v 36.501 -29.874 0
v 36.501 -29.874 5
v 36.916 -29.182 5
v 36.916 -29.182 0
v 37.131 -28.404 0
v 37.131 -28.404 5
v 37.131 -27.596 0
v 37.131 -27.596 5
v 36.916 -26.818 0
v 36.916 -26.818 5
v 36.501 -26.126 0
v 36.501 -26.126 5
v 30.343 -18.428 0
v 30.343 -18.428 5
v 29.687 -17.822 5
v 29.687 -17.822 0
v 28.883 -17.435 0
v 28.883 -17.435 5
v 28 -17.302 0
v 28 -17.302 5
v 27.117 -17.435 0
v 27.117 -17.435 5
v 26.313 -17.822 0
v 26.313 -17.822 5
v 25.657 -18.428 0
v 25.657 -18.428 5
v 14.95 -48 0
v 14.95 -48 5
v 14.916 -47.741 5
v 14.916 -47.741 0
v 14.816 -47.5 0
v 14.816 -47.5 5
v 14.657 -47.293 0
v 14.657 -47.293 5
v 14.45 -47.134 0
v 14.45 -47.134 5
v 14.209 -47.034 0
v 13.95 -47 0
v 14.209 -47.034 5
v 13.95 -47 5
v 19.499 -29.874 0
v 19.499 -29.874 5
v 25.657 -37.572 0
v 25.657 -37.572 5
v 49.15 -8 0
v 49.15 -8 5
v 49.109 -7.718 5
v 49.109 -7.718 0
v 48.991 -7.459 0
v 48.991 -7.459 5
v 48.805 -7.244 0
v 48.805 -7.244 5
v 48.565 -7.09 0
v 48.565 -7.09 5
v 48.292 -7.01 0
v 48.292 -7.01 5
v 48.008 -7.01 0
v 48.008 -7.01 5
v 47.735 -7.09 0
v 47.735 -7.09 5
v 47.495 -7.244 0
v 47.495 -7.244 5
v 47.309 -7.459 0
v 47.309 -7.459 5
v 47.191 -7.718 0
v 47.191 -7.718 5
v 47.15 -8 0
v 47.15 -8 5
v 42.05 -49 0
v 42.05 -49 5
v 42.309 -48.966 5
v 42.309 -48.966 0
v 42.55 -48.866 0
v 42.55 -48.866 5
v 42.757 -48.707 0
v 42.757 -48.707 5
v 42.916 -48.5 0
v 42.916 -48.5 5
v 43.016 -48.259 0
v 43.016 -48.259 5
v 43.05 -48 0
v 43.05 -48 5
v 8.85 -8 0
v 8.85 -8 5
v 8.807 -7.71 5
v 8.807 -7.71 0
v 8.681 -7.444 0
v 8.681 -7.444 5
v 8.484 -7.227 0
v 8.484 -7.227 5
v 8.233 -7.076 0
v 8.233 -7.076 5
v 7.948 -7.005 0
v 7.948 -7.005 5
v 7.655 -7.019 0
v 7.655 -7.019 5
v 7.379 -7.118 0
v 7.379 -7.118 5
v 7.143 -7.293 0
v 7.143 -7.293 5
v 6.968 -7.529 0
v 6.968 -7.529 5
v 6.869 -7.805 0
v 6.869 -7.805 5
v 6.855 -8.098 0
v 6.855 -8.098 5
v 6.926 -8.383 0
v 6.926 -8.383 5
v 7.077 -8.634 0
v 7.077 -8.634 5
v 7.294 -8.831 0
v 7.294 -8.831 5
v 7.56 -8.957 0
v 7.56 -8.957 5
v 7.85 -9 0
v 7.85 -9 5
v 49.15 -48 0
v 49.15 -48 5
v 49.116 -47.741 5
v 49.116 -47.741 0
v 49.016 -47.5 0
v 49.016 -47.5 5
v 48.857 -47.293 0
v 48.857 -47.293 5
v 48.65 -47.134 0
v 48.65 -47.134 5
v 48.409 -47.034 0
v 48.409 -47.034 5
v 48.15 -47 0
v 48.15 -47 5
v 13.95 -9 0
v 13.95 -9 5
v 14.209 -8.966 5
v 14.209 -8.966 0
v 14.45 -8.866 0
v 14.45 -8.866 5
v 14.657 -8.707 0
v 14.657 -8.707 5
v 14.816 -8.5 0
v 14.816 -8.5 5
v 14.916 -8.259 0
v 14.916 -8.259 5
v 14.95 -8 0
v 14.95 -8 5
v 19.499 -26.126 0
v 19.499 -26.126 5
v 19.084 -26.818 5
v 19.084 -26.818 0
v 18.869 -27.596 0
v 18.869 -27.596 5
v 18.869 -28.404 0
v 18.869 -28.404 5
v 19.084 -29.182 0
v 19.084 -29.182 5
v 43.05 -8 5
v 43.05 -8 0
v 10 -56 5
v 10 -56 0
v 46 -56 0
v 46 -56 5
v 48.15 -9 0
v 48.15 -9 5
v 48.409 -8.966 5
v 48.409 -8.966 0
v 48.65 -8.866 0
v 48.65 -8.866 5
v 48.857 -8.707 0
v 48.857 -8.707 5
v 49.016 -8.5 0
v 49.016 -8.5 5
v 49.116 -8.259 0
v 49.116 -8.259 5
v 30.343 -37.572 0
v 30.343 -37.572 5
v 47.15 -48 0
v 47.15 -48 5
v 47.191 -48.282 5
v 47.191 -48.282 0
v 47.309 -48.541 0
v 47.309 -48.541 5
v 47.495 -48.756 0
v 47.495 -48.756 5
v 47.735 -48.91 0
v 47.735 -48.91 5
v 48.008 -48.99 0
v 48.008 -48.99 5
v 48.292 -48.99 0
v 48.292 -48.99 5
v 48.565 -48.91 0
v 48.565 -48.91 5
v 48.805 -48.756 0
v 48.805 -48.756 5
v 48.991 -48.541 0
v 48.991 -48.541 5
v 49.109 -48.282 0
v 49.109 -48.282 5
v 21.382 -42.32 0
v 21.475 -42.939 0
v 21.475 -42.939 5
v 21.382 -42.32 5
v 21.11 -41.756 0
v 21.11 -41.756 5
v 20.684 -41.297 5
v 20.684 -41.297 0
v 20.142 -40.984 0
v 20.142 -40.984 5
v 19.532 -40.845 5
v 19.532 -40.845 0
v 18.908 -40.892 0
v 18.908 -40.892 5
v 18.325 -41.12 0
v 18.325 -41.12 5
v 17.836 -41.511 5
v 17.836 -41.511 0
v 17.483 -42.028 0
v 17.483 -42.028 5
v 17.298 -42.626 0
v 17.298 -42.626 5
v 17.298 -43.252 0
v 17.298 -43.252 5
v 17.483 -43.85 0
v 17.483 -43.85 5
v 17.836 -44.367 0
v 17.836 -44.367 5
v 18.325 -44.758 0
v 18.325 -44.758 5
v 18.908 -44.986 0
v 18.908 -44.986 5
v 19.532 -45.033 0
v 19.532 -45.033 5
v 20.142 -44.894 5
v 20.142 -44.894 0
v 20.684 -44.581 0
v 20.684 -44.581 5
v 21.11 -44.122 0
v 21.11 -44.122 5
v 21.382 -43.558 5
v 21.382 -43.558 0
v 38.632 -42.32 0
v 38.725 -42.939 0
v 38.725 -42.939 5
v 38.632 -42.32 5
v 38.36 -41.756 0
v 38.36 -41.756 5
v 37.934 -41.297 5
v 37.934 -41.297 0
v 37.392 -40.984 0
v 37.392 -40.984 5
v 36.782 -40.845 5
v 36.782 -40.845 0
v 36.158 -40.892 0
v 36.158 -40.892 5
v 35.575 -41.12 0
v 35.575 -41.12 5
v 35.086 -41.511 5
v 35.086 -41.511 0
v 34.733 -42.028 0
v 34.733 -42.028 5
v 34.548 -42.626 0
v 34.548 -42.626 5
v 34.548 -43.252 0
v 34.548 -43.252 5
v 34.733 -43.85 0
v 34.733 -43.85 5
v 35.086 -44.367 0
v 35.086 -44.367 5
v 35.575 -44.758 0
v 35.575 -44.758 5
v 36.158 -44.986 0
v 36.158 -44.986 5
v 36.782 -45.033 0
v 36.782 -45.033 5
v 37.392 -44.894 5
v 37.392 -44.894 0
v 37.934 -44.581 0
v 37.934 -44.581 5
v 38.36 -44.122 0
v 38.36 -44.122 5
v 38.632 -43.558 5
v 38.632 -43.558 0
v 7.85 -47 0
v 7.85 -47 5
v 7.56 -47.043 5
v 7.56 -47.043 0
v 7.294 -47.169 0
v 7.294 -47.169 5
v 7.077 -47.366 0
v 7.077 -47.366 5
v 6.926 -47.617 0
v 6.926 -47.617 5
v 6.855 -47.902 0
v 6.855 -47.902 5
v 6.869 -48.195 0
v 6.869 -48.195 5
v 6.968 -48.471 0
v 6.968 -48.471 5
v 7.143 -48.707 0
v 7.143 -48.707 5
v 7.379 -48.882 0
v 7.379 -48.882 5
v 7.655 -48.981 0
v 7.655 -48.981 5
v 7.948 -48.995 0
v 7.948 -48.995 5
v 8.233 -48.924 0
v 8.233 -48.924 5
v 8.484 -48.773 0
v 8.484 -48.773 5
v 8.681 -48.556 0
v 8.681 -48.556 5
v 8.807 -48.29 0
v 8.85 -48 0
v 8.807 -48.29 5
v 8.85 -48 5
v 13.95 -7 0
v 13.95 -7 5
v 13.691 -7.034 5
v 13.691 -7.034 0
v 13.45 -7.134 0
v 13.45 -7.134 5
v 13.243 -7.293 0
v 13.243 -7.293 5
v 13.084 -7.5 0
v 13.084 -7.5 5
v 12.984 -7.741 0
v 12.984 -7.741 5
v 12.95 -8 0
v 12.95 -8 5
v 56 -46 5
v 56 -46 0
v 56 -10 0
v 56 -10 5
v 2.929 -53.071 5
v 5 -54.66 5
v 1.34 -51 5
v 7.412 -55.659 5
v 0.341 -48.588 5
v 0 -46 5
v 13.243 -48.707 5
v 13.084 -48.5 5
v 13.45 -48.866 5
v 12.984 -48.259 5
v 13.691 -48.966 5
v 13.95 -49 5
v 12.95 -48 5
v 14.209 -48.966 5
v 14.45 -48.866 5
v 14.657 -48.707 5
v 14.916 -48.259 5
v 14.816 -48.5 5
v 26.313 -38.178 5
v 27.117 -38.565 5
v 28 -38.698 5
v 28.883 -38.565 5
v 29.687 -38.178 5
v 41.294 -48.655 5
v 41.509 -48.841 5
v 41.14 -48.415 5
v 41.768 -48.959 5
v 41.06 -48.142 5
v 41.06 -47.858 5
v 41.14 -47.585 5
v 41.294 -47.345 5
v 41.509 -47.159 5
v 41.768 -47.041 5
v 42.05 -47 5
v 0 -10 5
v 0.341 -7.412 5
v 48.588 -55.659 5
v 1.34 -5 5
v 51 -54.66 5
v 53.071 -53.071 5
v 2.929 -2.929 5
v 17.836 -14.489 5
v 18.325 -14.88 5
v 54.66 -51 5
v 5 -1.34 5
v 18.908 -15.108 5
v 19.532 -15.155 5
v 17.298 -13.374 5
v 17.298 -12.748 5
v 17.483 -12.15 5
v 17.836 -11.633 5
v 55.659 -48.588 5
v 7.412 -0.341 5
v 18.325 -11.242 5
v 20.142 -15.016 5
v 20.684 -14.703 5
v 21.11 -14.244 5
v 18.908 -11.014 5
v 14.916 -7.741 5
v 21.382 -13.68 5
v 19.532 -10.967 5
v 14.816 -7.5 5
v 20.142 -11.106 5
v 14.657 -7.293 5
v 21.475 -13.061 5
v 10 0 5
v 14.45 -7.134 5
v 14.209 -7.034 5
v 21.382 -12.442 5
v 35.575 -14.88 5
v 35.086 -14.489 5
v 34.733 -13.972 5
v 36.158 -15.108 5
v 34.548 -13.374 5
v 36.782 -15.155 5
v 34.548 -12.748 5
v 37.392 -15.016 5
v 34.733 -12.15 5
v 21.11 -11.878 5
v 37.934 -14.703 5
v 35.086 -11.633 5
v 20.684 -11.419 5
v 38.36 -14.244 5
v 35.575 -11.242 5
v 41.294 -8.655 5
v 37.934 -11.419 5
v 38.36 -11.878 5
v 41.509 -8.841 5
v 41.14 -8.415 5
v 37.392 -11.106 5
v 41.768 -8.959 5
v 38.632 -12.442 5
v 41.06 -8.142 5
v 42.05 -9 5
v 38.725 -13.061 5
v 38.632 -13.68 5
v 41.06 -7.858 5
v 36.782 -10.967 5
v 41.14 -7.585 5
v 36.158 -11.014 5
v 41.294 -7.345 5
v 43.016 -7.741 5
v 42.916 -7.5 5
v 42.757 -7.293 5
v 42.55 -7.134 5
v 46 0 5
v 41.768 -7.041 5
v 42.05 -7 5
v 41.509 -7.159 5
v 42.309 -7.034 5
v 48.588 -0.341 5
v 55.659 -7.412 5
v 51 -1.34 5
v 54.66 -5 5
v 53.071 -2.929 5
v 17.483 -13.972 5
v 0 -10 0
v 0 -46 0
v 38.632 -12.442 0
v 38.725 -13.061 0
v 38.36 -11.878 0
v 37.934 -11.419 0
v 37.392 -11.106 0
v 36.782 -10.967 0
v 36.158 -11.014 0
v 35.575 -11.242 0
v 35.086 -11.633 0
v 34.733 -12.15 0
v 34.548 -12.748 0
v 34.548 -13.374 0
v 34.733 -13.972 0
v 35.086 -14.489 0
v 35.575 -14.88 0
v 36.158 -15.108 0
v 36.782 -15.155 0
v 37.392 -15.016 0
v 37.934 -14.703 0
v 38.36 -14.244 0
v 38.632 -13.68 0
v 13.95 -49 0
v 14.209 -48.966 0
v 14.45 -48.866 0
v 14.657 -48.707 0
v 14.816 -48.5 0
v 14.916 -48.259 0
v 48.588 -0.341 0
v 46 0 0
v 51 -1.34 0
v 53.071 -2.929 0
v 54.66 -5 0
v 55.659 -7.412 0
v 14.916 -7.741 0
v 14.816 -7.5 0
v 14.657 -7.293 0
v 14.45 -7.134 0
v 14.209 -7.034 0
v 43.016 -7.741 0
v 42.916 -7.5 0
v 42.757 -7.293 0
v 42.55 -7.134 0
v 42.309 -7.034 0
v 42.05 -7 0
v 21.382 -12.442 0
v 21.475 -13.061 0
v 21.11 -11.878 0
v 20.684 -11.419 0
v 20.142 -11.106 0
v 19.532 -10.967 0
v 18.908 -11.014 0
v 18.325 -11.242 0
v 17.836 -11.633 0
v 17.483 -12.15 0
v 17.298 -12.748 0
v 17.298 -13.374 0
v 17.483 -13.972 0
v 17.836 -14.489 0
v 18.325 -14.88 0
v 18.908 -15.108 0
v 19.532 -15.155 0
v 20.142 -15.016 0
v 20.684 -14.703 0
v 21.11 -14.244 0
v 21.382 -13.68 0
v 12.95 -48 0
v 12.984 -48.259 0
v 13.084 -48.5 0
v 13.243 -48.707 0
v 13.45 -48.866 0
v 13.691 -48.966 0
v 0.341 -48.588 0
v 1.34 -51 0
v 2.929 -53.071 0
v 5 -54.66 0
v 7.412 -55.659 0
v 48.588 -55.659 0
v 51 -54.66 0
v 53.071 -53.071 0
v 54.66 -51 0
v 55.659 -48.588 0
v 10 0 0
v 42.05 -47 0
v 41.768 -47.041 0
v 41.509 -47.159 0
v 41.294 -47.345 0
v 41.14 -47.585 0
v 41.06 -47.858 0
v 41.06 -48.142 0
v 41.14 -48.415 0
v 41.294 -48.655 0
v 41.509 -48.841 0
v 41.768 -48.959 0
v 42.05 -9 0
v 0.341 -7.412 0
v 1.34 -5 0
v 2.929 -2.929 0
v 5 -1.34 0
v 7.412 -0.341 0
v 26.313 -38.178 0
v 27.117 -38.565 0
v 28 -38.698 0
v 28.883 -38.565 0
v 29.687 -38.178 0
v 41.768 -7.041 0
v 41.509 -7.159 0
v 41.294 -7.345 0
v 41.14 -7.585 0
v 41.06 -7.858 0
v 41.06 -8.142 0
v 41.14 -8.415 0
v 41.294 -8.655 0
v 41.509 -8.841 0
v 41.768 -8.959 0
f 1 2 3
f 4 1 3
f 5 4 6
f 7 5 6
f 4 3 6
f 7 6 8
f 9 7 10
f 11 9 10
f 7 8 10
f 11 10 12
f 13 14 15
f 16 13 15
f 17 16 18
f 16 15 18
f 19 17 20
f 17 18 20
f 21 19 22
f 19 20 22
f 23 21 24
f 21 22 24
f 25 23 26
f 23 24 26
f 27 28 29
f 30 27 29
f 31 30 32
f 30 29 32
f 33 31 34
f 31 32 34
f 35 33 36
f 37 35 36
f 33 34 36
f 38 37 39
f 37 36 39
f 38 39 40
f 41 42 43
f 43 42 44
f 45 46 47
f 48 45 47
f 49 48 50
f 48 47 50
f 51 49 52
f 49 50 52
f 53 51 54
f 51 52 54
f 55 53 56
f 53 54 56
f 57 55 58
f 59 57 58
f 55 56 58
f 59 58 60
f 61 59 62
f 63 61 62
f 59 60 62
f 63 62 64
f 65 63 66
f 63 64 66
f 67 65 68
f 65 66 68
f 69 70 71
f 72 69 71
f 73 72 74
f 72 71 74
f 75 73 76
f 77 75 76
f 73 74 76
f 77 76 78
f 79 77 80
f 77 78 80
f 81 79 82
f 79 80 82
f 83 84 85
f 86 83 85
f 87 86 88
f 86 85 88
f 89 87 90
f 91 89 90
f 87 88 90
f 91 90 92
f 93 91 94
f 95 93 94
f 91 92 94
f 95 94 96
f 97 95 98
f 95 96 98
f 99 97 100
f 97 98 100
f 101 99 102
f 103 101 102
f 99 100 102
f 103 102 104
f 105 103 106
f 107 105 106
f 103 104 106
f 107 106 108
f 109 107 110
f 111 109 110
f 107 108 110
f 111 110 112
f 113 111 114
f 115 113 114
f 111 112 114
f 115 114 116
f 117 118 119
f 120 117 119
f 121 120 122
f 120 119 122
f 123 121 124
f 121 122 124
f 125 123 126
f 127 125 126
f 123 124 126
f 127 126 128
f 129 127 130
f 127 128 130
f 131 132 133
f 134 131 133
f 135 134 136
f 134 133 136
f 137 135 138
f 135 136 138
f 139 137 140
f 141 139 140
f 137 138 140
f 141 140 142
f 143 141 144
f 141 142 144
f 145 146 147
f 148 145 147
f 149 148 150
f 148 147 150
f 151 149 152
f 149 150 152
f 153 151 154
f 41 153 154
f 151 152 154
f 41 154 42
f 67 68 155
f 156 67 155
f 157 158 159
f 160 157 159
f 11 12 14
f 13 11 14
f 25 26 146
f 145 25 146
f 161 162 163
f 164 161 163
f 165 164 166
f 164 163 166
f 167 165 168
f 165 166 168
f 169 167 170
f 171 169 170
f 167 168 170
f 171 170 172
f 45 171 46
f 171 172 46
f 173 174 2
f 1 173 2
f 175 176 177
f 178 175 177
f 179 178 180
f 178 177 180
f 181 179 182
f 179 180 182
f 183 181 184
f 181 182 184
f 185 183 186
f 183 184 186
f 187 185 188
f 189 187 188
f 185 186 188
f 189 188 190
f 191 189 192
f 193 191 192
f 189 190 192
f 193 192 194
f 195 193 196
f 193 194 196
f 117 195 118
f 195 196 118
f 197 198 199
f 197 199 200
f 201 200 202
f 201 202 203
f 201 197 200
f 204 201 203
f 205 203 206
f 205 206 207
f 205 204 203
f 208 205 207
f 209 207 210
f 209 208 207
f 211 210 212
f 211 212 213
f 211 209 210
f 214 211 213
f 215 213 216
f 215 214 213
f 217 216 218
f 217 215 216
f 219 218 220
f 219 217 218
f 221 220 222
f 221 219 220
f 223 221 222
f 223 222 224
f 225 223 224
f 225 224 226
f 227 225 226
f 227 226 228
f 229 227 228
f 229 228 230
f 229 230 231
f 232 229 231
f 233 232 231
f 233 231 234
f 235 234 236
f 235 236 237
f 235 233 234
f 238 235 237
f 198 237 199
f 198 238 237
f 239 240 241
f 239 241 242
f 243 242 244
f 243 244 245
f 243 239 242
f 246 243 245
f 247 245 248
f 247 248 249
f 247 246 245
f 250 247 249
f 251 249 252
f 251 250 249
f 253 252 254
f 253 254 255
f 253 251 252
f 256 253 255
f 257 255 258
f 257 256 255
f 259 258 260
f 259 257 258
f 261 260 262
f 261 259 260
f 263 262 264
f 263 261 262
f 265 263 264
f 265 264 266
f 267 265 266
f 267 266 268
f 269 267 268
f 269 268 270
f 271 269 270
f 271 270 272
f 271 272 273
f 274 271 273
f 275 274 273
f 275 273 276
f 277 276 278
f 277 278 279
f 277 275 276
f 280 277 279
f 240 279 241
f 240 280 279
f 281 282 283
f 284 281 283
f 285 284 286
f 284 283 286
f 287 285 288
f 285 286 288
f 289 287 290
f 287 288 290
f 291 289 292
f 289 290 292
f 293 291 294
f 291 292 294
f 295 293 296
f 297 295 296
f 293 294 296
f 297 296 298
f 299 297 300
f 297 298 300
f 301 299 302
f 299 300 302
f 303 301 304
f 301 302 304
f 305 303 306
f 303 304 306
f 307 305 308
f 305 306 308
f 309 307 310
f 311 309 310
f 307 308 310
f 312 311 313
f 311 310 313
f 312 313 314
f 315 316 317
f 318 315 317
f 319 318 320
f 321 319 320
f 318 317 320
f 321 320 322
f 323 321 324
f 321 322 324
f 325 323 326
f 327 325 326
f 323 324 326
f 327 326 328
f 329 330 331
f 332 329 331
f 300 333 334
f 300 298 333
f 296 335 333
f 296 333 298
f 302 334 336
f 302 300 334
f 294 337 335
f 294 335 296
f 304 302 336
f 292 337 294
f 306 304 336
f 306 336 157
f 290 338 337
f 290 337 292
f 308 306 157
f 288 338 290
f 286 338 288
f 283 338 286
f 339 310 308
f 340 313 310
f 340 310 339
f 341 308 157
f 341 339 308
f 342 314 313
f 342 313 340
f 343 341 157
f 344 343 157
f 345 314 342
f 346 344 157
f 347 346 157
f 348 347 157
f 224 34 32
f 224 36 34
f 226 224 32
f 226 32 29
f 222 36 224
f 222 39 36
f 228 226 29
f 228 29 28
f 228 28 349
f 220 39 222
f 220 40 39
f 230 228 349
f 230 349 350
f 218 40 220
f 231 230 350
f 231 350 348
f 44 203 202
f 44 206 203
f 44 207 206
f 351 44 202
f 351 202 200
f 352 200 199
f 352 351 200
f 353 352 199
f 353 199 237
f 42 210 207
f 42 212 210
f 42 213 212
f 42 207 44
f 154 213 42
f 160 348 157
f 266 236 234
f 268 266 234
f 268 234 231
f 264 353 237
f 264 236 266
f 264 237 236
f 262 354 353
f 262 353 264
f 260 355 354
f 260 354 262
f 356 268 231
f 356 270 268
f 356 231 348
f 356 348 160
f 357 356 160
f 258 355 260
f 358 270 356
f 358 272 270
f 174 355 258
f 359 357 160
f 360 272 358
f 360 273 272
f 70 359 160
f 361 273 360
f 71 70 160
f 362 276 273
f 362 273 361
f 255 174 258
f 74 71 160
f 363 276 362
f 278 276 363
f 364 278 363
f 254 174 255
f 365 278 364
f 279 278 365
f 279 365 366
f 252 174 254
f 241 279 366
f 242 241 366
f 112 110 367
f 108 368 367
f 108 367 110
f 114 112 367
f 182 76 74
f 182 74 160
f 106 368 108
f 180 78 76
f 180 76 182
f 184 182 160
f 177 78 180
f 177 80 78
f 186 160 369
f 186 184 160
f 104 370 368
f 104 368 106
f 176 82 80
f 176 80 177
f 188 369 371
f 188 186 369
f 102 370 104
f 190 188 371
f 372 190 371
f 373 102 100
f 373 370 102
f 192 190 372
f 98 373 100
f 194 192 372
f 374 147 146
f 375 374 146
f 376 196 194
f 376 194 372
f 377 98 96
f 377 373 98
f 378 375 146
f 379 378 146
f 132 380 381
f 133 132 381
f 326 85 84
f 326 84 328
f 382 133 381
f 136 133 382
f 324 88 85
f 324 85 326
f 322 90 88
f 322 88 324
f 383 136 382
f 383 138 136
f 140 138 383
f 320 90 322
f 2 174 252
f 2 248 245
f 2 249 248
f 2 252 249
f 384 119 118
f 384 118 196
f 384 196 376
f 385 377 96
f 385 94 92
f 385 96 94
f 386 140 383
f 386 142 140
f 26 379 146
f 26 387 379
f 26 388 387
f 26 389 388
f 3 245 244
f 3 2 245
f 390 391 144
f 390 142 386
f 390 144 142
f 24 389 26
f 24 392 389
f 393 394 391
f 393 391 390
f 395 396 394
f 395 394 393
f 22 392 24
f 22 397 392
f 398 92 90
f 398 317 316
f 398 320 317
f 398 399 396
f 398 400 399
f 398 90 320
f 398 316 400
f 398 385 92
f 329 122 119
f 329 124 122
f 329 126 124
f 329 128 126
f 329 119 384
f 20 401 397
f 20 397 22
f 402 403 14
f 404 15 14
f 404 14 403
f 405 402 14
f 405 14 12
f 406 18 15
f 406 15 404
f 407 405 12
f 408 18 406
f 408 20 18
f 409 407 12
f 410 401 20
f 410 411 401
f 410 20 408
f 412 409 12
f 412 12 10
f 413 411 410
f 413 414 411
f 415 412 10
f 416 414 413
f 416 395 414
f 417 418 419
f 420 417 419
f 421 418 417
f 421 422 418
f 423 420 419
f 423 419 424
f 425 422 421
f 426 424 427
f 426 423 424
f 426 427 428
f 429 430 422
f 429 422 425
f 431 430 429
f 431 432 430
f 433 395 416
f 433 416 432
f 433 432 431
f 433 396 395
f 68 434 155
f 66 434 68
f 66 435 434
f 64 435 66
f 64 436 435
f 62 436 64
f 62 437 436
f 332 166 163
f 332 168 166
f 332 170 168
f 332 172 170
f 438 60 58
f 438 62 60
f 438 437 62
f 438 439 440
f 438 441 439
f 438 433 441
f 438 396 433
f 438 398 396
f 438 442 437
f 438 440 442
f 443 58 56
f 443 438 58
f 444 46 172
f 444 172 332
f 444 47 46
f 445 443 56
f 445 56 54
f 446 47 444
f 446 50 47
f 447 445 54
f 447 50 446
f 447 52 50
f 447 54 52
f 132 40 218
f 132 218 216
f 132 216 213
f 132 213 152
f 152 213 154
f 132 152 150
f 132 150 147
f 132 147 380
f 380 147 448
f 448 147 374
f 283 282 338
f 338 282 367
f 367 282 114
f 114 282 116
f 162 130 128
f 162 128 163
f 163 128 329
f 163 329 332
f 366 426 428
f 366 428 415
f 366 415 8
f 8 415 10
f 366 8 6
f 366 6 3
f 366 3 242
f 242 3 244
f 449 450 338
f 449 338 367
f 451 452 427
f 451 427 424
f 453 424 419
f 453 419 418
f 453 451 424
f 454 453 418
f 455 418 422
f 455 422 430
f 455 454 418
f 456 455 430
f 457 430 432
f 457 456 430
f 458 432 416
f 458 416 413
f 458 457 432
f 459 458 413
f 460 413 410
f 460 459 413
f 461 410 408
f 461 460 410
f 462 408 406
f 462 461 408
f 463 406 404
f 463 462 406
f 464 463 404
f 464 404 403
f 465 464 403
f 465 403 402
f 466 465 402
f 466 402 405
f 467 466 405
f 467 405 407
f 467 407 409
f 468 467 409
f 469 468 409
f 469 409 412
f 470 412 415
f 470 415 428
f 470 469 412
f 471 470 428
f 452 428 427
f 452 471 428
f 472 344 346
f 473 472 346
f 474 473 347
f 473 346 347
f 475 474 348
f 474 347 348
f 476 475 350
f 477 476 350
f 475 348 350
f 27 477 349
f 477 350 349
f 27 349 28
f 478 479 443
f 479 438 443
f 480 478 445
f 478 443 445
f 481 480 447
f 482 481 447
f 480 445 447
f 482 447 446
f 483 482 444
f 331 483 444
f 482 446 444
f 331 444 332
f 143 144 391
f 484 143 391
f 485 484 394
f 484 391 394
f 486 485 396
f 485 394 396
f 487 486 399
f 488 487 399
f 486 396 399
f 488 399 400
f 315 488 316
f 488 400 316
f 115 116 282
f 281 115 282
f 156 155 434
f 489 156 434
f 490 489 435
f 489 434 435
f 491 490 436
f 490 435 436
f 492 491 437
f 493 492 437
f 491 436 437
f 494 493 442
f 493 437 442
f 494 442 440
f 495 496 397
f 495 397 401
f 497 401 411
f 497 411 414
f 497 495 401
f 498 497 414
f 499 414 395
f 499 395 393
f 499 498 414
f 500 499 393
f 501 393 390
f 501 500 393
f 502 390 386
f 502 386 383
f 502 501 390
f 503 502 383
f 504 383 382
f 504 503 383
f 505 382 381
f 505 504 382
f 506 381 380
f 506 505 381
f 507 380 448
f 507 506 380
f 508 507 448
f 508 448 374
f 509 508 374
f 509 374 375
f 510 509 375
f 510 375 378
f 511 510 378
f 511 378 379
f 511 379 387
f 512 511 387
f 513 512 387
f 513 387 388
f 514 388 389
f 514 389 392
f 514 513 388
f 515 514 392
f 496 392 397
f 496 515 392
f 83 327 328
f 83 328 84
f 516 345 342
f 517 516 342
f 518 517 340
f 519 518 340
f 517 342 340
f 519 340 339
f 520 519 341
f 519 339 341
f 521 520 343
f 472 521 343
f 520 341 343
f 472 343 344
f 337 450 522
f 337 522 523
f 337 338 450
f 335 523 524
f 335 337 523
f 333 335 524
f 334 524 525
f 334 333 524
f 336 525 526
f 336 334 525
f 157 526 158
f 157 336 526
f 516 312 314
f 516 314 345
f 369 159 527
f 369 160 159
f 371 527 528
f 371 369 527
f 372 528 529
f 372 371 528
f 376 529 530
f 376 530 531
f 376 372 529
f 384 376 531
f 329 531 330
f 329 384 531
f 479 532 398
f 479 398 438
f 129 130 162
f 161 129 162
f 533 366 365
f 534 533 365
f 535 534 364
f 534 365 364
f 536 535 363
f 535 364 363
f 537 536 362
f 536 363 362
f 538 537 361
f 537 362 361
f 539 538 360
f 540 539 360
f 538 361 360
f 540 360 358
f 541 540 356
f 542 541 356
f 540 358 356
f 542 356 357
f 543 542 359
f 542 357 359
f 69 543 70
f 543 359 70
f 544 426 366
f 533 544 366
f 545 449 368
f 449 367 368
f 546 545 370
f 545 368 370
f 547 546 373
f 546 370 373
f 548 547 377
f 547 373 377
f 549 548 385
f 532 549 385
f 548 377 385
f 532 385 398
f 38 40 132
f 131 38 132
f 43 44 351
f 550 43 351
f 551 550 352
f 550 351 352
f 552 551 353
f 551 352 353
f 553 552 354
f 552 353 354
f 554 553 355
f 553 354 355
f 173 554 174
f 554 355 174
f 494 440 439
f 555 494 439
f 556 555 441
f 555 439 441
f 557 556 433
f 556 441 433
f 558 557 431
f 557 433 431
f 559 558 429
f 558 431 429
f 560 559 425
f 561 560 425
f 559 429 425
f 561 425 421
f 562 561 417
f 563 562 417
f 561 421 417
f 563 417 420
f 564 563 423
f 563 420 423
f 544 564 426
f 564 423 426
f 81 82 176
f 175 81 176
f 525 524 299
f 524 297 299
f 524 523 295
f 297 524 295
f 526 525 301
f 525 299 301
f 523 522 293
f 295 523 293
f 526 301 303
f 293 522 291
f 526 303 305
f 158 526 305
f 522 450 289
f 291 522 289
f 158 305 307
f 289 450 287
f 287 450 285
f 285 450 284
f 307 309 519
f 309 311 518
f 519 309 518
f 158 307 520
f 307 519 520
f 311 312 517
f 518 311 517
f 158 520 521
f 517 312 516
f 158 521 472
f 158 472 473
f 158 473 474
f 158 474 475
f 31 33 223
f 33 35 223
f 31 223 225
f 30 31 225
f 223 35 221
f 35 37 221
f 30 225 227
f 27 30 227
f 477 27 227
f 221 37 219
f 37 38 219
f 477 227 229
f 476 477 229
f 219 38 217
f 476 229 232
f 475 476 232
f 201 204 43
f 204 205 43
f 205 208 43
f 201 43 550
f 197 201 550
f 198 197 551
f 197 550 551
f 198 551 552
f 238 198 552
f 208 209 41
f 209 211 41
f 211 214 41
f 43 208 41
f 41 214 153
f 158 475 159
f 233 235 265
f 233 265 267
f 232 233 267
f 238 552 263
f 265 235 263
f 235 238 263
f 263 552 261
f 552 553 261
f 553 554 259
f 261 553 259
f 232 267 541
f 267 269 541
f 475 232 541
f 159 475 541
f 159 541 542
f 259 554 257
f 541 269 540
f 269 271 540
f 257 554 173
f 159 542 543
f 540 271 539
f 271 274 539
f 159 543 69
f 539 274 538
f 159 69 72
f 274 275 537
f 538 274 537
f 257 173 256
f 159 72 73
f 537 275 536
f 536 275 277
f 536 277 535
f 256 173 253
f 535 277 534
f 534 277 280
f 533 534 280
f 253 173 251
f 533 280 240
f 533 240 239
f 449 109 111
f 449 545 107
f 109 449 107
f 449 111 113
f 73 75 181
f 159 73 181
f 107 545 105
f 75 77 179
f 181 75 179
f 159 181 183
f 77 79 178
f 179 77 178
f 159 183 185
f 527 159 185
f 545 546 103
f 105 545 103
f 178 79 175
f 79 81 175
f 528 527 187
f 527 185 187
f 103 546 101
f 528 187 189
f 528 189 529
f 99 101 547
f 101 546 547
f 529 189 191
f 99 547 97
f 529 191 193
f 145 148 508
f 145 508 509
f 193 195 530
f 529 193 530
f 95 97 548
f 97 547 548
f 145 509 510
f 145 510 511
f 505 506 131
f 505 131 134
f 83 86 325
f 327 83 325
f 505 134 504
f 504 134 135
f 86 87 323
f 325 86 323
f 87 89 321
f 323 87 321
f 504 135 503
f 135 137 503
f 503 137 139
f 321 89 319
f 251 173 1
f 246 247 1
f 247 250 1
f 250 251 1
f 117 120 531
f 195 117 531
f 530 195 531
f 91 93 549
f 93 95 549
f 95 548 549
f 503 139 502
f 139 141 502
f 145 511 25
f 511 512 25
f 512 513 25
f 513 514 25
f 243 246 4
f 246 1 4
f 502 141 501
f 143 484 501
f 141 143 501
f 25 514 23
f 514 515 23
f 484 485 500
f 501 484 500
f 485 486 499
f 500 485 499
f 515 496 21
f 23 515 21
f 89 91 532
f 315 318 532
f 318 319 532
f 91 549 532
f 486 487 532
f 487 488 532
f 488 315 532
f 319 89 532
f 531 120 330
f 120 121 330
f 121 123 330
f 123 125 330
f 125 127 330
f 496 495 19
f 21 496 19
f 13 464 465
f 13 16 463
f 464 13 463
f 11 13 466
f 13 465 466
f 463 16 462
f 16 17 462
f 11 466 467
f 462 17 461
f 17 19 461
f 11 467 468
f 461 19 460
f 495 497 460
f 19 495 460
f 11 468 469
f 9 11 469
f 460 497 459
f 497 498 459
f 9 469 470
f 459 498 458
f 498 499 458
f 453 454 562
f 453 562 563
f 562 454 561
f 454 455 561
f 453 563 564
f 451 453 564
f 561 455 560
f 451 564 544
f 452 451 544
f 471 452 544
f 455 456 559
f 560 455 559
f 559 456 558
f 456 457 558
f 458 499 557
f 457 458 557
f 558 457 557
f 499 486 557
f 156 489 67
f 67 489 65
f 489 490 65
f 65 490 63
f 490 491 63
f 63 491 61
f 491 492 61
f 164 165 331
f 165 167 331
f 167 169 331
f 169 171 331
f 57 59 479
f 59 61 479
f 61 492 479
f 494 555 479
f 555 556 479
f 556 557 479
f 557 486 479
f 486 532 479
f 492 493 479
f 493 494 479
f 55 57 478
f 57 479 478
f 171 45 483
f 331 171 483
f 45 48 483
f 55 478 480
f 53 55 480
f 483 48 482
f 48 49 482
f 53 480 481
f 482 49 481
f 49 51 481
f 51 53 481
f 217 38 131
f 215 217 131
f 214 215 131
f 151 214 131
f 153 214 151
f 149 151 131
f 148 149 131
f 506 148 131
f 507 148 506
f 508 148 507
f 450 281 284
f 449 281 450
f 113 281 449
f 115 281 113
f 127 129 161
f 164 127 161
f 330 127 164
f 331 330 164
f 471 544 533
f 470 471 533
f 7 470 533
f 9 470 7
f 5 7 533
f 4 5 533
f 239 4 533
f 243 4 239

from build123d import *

# Parameters (mm, degrees)
SKETCH_1_W          = 56
SKETCH_1_H          = 56
SKETCH_1_R          = 2.1
EXTRUDE_1_DEPTH     = 5
FILLET_1_R          = 10
CUT_EXTRUDE_1_DEPTH = 16
CUT_EXTRUDE_2_DEPTH = 16


with BuildPart() as part:
    # 草图1 → 凸台-拉伸1 (new body)
    with BuildSketch(Plane.XY):
        with Locations((28, -28)):
            Rectangle(SKETCH_1_W, SKETCH_1_H)
        with Locations((36.625, -13.061061785)):
            Circle(SKETCH_1_R, mode=Mode.SUBTRACT)
        with Locations((19.375, -13.061061785)):
            Circle(SKETCH_1_R, mode=Mode.SUBTRACT)
        with Locations((36.625, -42.938938215)):
            Circle(SKETCH_1_R, mode=Mode.SUBTRACT)
        with Locations((19.375, -42.938938215)):
            Circle(SKETCH_1_R, mode=Mode.SUBTRACT)
    extrude(amount=EXTRUDE_1_DEPTH)

    # 圆角1
    fillet_1_edges = [part.edges().sort_by_distance(p)[0] for p in [
        (56, -56, 2.5),
        (0, -56, 2.5),
        (0, 0, 2.5),
        (56, 0, 2.5),
    ]]
    fillet(fillet_1_edges, radius=FILLET_1_R)

    # 草图2 → 切除-拉伸1 (cut)
    with BuildSketch(Plane.XY.offset(5)):
        with BuildLine():
            Line((47.15, -8), (43.05, -8))
            ThreePointArc((43.05, -8), (42.757106781, -8.707106781), (42.05, -9))
            Line((42.05, -9), (42.05, -47))
            ThreePointArc((42.05, -47), (42.757106781, -47.292893219), (43.05, -48))
            Line((43.05, -48), (47.15, -48))
            ThreePointArc((47.15, -48), (47.442893219, -47.292893219), (48.15, -47))
            Line((48.15, -47), (48.15, -9))
            ThreePointArc((48.15, -9), (47.442893219, -8.707106781), (47.15, -8))
        make_face()
        with BuildLine():
            ThreePointArc((43.05, -8), (42.757106781, -7.292893219), (42.05, -7))
            Line((42.05, -7), (42.05, -8))
            Line((42.05, -8), (43.05, -8))
        make_face()
        with BuildLine():
            Line((43.05, -8), (42.05, -8))
            Line((42.05, -8), (42.05, -9))
            ThreePointArc((42.05, -9), (42.757106781, -8.707106781), (43.05, -8))
        make_face()
        with BuildLine():
            Line((42.05, -8), (42.05, -7))
            ThreePointArc((42.05, -7), (41.05, -8), (42.05, -9))
            Line((42.05, -9), (42.05, -8))
        make_face()
        with BuildLine():
            ThreePointArc((49.15, -8), (48.15, -7), (47.15, -8))
            Line((47.15, -8), (48.15, -8))
            Line((48.15, -8), (48.15, -9))
            ThreePointArc((48.15, -9), (48.857106781, -8.707106781), (49.15, -8))
        make_face()
        with BuildLine():
            Line((48.15, -8), (47.15, -8))
            ThreePointArc((47.15, -8), (47.442893219, -8.707106781), (48.15, -9))
            Line((48.15, -9), (48.15, -8))
        make_face()
        with BuildLine():
            ThreePointArc((49.15, -48), (48.857106781, -47.292893219), (48.15, -47))
            Line((48.15, -47), (48.15, -48))
            Line((48.15, -48), (47.15, -48))
            ThreePointArc((47.15, -48), (48.15, -49), (49.15, -48))
        make_face()
        with BuildLine():
            Line((48.15, -48), (48.15, -47))
            ThreePointArc((48.15, -47), (47.442893219, -47.292893219), (47.15, -48))
            Line((47.15, -48), (48.15, -48))
        make_face()
        with BuildLine():
            ThreePointArc((43.05, -48), (42.757106781, -47.292893219), (42.05, -47))
            Line((42.05, -47), (42.05, -48))
            Line((42.05, -48), (43.05, -48))
        make_face()
        with BuildLine():
            Line((43.05, -48), (42.05, -48))
            Line((42.05, -48), (42.05, -49))
            ThreePointArc((42.05, -49), (42.757106781, -48.707106781), (43.05, -48))
        make_face()
        with BuildLine():
            Line((42.05, -48), (42.05, -47))
            ThreePointArc((42.05, -47), (41.05, -48), (42.05, -49))
            Line((42.05, -49), (42.05, -48))
        make_face()
        with BuildLine():
            Line((13.95, -48), (13.95, -47))
            ThreePointArc((13.95, -47), (13.242893219, -47.292893219), (12.95, -48))
            Line((12.95, -48), (13.95, -48))
        make_face()
        with BuildLine():
            ThreePointArc((12.95, -48), (13.242893219, -48.707106781), (13.95, -49))
            Line((13.95, -49), (13.95, -48))
            Line((13.95, -48), (12.95, -48))
        make_face()
        with BuildLine():
            ThreePointArc((14.95, -48), (14.657106781, -47.292893219), (13.95, -47))
            Line((13.95, -47), (13.95, -48))
            Line((13.95, -48), (13.95, -49))
            ThreePointArc((13.95, -49), (14.657106781, -48.707106781), (14.95, -48))
        make_face()
        with BuildLine():
            ThreePointArc((13.95, -9), (13.242893219, -8.707106781), (12.95, -8))
            Line((12.95, -8), (8.85, -8))
            ThreePointArc((8.85, -8), (8.557106781, -8.707106781), (7.85, -9))
            Line((7.85, -9), (7.85, -47))
            ThreePointArc((7.85, -47), (8.557106781, -47.292893219), (8.85, -48))
            Line((8.85, -48), (12.95, -48))
            ThreePointArc((12.95, -48), (13.242893219, -47.292893219), (13.95, -47))
            Line((13.95, -47), (13.95, -9))
        make_face()
        with BuildLine():
            ThreePointArc((8.85, -48), (8.557106781, -47.292893219), (7.85, -47))
            Line((7.85, -47), (7.85, -48))
            Line((7.85, -48), (8.85, -48))
        make_face()
        with BuildLine():
            Line((7.85, -48), (7.85, -47))
            ThreePointArc((7.85, -47), (7.142893219, -48.707106781), (8.85, -48))
            Line((8.85, -48), (7.85, -48))
        make_face()
        with BuildLine():
            ThreePointArc((7.85, -9), (8.557106781, -8.707106781), (8.85, -8))
            Line((8.85, -8), (7.85, -8))
            Line((7.85, -8), (7.85, -9))
        make_face()
        with BuildLine():
            Line((7.85, -8), (8.85, -8))
            ThreePointArc((8.85, -8), (7.142893219, -7.292893219), (7.85, -9))
            Line((7.85, -9), (7.85, -8))
        make_face()
        with BuildLine():
            ThreePointArc((14.95, -8), (14.657106781, -7.292893219), (13.95, -7))
            Line((13.95, -7), (13.95, -8))
            Line((13.95, -8), (13.95, -9))
            ThreePointArc((13.95, -9), (14.657106781, -8.707106781), (14.95, -8))
        make_face()
        with BuildLine():
            Line((13.95, -8), (13.95, -7))
            ThreePointArc((13.95, -7), (13.242893219, -7.292893219), (12.95, -8))
            Line((12.95, -8), (13.95, -8))
        make_face()
        with BuildLine():
            Line((13.95, -9), (13.95, -8))
            Line((13.95, -8), (12.95, -8))
            ThreePointArc((12.95, -8), (13.242893219, -8.707106781), (13.95, -9))
        make_face()
    extrude(amount=-CUT_EXTRUDE_1_DEPTH, mode=Mode.SUBTRACT)

    # 草图3 → 切除-拉伸2 (cut)
    with BuildSketch(Plane.XY.offset(5)):
        with BuildLine():
            Line((25.657393572, -18.428258035), (19.499268114, -26.125914857))
            ThreePointArc((19.499268114, -26.125914857), (18.841874542, -28), (19.499268114, -29.874085143))
            Line((19.499268114, -29.874085143), (25.657393572, -37.571741965))
            ThreePointArc((25.657393572, -37.571741965), (28, -38.697656822), (30.342606428, -37.571741965))
            Line((30.342606428, -37.571741965), (36.500731886, -29.874085143))
            ThreePointArc((36.500731886, -29.874085143), (37.158125458, -28), (36.500731886, -26.125914857))
            Line((36.500731886, -26.125914857), (30.342606428, -18.428258035))
            ThreePointArc((30.342606428, -18.428258035), (28, -17.302343178), (25.657393572, -18.428258035))
        make_face()
    extrude(amount=-CUT_EXTRUDE_2_DEPTH, mode=Mode.SUBTRACT)


solid = part.part
